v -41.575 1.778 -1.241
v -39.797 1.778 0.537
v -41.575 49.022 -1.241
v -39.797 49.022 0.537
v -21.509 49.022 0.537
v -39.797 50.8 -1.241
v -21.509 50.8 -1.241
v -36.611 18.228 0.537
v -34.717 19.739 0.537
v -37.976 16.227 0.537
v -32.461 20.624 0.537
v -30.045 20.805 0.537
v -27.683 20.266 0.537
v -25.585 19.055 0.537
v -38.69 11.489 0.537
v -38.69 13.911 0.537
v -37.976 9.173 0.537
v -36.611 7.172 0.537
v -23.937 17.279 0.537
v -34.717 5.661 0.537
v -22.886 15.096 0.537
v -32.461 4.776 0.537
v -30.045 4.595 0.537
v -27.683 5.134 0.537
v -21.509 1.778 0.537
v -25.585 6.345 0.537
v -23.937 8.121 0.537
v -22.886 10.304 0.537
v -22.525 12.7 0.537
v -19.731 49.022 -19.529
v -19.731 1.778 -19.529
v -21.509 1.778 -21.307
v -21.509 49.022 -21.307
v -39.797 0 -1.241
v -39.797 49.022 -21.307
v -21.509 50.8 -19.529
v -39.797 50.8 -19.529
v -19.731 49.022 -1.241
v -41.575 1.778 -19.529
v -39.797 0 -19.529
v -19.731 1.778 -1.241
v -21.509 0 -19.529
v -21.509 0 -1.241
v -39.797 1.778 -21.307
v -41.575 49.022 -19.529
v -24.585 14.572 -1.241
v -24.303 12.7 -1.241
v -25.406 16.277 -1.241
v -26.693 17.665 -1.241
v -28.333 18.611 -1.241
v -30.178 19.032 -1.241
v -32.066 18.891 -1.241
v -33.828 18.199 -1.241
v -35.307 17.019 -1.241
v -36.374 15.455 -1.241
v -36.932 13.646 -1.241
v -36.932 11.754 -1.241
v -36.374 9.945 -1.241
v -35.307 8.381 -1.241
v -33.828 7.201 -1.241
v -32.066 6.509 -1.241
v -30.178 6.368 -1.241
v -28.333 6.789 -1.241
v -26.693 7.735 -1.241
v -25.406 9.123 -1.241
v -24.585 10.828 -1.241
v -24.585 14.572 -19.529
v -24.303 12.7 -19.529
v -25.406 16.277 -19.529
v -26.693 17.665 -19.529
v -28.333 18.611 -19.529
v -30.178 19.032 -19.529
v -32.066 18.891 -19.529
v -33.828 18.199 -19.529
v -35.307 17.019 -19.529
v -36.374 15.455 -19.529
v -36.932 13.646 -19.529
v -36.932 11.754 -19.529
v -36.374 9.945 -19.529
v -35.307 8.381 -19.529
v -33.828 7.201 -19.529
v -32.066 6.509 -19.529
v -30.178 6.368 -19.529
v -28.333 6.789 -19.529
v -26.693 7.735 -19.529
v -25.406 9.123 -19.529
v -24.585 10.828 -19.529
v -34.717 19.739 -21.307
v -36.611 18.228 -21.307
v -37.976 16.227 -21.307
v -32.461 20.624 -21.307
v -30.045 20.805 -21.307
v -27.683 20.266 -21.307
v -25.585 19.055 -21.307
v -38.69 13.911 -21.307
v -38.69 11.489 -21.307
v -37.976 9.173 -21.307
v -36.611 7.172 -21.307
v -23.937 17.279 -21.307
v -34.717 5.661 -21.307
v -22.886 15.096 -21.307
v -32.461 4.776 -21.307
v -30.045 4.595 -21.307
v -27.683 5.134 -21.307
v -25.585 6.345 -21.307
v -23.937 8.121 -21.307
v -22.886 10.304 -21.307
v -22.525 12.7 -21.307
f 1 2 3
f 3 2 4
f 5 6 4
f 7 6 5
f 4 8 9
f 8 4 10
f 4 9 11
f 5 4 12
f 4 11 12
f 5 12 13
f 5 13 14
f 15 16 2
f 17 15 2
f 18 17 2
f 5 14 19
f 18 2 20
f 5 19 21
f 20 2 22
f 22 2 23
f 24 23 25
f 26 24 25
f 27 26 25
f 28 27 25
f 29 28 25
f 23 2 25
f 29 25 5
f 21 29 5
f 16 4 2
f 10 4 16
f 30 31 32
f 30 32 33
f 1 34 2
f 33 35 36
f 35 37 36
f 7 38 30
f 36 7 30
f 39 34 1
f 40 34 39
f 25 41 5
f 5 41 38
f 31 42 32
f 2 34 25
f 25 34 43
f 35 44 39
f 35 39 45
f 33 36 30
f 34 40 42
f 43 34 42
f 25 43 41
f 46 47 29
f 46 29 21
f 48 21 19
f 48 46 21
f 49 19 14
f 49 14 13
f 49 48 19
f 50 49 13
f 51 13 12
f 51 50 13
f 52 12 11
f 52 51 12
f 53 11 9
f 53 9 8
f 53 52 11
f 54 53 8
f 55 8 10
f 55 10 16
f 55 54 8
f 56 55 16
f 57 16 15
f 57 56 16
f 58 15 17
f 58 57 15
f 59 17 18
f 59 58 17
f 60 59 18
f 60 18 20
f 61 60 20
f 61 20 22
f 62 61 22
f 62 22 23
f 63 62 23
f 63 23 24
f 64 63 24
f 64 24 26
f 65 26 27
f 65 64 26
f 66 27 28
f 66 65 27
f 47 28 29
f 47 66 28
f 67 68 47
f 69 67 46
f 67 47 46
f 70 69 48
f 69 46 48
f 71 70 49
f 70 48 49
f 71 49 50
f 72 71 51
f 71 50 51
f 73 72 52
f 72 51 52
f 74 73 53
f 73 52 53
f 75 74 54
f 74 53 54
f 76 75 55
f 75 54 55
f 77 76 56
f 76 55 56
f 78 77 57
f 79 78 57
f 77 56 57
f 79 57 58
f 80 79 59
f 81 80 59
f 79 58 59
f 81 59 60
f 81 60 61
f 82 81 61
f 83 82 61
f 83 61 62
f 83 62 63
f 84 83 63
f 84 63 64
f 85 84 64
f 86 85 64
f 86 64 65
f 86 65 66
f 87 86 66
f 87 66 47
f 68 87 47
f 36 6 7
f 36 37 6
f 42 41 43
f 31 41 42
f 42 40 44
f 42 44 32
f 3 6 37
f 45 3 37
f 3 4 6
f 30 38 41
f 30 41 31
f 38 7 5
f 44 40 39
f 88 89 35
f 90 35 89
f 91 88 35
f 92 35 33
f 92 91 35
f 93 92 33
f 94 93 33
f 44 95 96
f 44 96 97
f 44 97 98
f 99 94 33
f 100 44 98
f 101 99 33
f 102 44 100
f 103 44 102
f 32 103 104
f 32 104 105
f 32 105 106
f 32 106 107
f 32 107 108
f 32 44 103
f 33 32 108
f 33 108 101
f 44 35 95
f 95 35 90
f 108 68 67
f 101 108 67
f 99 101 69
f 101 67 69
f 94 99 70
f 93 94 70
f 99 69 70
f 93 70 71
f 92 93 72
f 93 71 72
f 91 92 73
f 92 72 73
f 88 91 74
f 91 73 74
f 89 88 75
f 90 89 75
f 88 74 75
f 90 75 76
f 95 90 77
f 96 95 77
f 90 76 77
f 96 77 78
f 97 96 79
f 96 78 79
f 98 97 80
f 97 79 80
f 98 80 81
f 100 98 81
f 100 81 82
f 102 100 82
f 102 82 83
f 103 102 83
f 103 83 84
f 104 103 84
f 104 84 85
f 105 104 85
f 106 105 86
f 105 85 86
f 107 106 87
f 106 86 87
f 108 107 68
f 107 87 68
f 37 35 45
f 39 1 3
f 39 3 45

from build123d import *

# Parameters (mm, degrees)
SKETCH1_W           = 21.844
SKETCH1_H           = 21.844
BOSS_EXTRUDE1_DEPTH = 50.8
SKETCH3_R           = 6.35
CUT_EXTRUDE2_DEPTH  = 70.182669358
CHAMFER1_SIZE       = 1.778


with BuildPart() as part:
    # Sketch1 → Boss-Extrude1 (new body)
    with BuildSketch(Plane(origin=(0, 0, 0), x_dir=(1, 0, 0), z_dir=(0, 1, 0))):
        with Locations((-30.652528302, 10.384945755)):
            Rectangle(SKETCH1_W, SKETCH1_H)
    extrude(amount=BOSS_EXTRUDE1_DEPTH)

    # Sketch3 → Cut-Extrude2 (cut, through all)
    with BuildSketch(Plane.XY.offset(0.537054245)):
        with Locations((-30.652528302, 12.7)):
            Circle(SKETCH3_R)
    extrude(amount=-CUT_EXTRUDE2_DEPTH, mode=Mode.SUBTRACT)

    # Chamfer1
    chamfer1_edges = [part.edges().sort_by_distance(p)[0] for p in [
        (-30.652528302, 50.8, 0.537054245),
        (-37.002528302, 12.7, -21.306945755),
        (-37.002528302, 12.7, 0.537054245),
        (-19.730528302, 50.8, -10.384945755),
        (-30.652528302, 50.8, -21.306945755),
        (-19.730528302, 0, -10.384945755),
        (-30.652528302, 0, 0.537054245),
        (-41.574528302, 0, -10.384945755),
        (-30.652528302, 0, -21.306945755),
        (-19.730528302, 25.4, -21.306945755),
        (-19.730528302, 25.4, 0.537054245),
        (-41.574528302, 25.4, 0.537054245),
        (-41.574528302, 25.4, -21.306945755),
        (-41.574528302, 50.8, -10.384945755),
    ]]
    chamfer(chamfer1_edges, length=CHAMFER1_SIZE)


solid = part.part
